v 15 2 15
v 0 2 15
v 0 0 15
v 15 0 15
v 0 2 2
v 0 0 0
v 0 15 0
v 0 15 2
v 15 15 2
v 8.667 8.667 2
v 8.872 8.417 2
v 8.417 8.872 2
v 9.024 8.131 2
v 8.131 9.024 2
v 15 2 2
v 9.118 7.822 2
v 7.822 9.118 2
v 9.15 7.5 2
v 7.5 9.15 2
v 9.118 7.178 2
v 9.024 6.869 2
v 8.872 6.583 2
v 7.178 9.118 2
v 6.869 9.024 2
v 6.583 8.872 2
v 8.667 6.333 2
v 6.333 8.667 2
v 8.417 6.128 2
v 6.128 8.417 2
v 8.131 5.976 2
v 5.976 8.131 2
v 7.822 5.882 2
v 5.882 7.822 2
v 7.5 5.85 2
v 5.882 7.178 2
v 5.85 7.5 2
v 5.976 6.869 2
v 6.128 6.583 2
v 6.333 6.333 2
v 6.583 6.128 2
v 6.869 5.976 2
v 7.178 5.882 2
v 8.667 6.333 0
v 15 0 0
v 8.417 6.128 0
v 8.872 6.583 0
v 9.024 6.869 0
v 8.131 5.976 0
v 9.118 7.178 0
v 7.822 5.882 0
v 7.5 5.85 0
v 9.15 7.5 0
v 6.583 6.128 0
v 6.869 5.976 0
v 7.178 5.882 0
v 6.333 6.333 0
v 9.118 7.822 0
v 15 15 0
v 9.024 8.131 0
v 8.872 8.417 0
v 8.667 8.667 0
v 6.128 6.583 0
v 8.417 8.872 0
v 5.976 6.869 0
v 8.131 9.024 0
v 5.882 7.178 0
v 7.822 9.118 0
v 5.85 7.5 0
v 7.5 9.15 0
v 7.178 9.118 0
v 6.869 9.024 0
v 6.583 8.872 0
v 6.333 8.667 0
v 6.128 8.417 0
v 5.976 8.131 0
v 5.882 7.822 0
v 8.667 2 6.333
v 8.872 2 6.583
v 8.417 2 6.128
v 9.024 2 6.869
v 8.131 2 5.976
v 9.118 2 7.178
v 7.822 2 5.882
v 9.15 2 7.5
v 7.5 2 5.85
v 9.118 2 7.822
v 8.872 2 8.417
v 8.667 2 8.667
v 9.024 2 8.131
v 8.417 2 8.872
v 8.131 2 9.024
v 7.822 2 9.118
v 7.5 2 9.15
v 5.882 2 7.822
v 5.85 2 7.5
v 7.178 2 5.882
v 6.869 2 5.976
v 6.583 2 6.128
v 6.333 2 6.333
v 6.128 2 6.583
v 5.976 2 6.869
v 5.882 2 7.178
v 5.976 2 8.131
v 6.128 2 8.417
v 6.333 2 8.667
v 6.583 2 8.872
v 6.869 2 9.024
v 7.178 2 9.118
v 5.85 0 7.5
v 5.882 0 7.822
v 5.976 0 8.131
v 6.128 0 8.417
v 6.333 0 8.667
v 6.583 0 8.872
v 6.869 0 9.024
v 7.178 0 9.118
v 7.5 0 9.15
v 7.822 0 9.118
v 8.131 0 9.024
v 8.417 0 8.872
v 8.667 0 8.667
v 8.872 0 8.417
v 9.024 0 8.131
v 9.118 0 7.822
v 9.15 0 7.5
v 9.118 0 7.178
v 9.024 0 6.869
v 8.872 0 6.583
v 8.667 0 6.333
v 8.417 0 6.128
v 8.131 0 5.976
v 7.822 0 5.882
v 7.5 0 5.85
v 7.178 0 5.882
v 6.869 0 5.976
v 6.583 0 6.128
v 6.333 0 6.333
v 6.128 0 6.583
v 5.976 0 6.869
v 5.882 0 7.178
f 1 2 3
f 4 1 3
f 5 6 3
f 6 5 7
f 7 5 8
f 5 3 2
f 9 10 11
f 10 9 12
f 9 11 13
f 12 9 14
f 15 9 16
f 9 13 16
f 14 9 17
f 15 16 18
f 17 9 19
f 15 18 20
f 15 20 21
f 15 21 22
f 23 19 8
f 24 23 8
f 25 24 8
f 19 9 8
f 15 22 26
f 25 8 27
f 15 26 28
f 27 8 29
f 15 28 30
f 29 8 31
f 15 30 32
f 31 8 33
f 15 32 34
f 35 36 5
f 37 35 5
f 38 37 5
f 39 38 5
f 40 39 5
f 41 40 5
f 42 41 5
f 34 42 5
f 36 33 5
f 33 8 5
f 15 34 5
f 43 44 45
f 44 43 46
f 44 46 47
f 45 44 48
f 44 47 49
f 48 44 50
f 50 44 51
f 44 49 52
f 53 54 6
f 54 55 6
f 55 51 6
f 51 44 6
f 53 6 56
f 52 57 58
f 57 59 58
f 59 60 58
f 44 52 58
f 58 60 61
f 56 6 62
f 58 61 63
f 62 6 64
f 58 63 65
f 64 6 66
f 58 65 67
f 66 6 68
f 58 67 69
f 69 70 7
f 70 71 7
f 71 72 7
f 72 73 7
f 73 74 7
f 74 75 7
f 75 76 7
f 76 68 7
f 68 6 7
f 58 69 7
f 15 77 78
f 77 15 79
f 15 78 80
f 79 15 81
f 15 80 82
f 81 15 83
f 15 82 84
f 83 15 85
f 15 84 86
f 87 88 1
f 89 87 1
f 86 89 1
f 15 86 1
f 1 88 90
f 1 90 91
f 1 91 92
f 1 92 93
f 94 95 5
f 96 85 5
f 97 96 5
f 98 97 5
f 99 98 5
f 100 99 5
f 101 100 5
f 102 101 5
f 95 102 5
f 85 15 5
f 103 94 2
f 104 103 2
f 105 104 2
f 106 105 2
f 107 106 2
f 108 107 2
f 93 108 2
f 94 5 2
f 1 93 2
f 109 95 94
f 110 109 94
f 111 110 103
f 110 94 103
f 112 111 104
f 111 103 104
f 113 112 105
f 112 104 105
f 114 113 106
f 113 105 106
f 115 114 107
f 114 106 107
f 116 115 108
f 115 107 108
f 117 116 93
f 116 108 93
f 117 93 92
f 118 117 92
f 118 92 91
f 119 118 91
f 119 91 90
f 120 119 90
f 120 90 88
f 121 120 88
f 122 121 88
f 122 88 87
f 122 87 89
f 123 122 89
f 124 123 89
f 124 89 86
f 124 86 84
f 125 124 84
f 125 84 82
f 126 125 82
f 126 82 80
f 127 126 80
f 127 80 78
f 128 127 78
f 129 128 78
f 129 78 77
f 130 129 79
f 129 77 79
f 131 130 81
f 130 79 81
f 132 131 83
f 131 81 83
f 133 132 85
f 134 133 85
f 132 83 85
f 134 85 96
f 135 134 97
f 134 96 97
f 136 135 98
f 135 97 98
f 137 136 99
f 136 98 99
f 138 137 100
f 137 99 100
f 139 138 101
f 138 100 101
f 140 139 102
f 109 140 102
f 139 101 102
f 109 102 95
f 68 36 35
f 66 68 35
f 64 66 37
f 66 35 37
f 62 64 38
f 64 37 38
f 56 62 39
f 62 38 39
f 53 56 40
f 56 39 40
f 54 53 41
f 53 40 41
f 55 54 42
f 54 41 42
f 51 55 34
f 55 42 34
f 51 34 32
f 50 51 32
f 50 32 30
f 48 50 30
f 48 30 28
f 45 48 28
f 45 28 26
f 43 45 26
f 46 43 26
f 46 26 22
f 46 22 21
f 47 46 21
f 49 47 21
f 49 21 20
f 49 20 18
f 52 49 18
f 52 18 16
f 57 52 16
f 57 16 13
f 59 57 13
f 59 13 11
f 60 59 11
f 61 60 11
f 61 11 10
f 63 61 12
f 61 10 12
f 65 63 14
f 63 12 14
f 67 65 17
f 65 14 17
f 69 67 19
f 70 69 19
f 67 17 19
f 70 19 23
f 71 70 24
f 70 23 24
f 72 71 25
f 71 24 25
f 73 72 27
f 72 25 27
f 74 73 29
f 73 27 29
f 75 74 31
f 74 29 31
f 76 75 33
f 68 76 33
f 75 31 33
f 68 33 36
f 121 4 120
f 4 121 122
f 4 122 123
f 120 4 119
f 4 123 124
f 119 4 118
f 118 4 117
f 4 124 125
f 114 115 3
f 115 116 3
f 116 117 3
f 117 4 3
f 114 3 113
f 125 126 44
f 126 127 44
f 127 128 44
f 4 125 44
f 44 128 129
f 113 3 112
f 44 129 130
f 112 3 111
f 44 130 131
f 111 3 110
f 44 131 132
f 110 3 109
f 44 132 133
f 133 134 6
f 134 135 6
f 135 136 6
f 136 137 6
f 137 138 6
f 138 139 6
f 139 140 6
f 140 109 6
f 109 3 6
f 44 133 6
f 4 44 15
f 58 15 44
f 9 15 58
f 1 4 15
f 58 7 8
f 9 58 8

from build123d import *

# Parameters (mm, degrees)
F1_DEPTH = 15
F3_D     = 3.3
F5_D     = 3.3


with BuildPart() as f1:
    # F0 (on Right) → F1 (new body)
    with BuildSketch(Plane.YZ):
        Polygon((0, 15), (0, 0), (15, 0), (15, 2), (2, 2), (2, 15), align=None)
    extrude(amount=F1_DEPTH)

    # F3 (through all)
    with Locations(Plane(origin=(0, 0, 0), x_dir=(1, 0, 0), z_dir=(0, 0, -1))):
        with Locations((7.5, -7.5)):
            Hole(F3_D / 2)

    # F5 (through all)
    with Locations(Plane.XZ):
        with Locations((7.5, 7.5)):
            Hole(F5_D / 2)


solid = f1.part
